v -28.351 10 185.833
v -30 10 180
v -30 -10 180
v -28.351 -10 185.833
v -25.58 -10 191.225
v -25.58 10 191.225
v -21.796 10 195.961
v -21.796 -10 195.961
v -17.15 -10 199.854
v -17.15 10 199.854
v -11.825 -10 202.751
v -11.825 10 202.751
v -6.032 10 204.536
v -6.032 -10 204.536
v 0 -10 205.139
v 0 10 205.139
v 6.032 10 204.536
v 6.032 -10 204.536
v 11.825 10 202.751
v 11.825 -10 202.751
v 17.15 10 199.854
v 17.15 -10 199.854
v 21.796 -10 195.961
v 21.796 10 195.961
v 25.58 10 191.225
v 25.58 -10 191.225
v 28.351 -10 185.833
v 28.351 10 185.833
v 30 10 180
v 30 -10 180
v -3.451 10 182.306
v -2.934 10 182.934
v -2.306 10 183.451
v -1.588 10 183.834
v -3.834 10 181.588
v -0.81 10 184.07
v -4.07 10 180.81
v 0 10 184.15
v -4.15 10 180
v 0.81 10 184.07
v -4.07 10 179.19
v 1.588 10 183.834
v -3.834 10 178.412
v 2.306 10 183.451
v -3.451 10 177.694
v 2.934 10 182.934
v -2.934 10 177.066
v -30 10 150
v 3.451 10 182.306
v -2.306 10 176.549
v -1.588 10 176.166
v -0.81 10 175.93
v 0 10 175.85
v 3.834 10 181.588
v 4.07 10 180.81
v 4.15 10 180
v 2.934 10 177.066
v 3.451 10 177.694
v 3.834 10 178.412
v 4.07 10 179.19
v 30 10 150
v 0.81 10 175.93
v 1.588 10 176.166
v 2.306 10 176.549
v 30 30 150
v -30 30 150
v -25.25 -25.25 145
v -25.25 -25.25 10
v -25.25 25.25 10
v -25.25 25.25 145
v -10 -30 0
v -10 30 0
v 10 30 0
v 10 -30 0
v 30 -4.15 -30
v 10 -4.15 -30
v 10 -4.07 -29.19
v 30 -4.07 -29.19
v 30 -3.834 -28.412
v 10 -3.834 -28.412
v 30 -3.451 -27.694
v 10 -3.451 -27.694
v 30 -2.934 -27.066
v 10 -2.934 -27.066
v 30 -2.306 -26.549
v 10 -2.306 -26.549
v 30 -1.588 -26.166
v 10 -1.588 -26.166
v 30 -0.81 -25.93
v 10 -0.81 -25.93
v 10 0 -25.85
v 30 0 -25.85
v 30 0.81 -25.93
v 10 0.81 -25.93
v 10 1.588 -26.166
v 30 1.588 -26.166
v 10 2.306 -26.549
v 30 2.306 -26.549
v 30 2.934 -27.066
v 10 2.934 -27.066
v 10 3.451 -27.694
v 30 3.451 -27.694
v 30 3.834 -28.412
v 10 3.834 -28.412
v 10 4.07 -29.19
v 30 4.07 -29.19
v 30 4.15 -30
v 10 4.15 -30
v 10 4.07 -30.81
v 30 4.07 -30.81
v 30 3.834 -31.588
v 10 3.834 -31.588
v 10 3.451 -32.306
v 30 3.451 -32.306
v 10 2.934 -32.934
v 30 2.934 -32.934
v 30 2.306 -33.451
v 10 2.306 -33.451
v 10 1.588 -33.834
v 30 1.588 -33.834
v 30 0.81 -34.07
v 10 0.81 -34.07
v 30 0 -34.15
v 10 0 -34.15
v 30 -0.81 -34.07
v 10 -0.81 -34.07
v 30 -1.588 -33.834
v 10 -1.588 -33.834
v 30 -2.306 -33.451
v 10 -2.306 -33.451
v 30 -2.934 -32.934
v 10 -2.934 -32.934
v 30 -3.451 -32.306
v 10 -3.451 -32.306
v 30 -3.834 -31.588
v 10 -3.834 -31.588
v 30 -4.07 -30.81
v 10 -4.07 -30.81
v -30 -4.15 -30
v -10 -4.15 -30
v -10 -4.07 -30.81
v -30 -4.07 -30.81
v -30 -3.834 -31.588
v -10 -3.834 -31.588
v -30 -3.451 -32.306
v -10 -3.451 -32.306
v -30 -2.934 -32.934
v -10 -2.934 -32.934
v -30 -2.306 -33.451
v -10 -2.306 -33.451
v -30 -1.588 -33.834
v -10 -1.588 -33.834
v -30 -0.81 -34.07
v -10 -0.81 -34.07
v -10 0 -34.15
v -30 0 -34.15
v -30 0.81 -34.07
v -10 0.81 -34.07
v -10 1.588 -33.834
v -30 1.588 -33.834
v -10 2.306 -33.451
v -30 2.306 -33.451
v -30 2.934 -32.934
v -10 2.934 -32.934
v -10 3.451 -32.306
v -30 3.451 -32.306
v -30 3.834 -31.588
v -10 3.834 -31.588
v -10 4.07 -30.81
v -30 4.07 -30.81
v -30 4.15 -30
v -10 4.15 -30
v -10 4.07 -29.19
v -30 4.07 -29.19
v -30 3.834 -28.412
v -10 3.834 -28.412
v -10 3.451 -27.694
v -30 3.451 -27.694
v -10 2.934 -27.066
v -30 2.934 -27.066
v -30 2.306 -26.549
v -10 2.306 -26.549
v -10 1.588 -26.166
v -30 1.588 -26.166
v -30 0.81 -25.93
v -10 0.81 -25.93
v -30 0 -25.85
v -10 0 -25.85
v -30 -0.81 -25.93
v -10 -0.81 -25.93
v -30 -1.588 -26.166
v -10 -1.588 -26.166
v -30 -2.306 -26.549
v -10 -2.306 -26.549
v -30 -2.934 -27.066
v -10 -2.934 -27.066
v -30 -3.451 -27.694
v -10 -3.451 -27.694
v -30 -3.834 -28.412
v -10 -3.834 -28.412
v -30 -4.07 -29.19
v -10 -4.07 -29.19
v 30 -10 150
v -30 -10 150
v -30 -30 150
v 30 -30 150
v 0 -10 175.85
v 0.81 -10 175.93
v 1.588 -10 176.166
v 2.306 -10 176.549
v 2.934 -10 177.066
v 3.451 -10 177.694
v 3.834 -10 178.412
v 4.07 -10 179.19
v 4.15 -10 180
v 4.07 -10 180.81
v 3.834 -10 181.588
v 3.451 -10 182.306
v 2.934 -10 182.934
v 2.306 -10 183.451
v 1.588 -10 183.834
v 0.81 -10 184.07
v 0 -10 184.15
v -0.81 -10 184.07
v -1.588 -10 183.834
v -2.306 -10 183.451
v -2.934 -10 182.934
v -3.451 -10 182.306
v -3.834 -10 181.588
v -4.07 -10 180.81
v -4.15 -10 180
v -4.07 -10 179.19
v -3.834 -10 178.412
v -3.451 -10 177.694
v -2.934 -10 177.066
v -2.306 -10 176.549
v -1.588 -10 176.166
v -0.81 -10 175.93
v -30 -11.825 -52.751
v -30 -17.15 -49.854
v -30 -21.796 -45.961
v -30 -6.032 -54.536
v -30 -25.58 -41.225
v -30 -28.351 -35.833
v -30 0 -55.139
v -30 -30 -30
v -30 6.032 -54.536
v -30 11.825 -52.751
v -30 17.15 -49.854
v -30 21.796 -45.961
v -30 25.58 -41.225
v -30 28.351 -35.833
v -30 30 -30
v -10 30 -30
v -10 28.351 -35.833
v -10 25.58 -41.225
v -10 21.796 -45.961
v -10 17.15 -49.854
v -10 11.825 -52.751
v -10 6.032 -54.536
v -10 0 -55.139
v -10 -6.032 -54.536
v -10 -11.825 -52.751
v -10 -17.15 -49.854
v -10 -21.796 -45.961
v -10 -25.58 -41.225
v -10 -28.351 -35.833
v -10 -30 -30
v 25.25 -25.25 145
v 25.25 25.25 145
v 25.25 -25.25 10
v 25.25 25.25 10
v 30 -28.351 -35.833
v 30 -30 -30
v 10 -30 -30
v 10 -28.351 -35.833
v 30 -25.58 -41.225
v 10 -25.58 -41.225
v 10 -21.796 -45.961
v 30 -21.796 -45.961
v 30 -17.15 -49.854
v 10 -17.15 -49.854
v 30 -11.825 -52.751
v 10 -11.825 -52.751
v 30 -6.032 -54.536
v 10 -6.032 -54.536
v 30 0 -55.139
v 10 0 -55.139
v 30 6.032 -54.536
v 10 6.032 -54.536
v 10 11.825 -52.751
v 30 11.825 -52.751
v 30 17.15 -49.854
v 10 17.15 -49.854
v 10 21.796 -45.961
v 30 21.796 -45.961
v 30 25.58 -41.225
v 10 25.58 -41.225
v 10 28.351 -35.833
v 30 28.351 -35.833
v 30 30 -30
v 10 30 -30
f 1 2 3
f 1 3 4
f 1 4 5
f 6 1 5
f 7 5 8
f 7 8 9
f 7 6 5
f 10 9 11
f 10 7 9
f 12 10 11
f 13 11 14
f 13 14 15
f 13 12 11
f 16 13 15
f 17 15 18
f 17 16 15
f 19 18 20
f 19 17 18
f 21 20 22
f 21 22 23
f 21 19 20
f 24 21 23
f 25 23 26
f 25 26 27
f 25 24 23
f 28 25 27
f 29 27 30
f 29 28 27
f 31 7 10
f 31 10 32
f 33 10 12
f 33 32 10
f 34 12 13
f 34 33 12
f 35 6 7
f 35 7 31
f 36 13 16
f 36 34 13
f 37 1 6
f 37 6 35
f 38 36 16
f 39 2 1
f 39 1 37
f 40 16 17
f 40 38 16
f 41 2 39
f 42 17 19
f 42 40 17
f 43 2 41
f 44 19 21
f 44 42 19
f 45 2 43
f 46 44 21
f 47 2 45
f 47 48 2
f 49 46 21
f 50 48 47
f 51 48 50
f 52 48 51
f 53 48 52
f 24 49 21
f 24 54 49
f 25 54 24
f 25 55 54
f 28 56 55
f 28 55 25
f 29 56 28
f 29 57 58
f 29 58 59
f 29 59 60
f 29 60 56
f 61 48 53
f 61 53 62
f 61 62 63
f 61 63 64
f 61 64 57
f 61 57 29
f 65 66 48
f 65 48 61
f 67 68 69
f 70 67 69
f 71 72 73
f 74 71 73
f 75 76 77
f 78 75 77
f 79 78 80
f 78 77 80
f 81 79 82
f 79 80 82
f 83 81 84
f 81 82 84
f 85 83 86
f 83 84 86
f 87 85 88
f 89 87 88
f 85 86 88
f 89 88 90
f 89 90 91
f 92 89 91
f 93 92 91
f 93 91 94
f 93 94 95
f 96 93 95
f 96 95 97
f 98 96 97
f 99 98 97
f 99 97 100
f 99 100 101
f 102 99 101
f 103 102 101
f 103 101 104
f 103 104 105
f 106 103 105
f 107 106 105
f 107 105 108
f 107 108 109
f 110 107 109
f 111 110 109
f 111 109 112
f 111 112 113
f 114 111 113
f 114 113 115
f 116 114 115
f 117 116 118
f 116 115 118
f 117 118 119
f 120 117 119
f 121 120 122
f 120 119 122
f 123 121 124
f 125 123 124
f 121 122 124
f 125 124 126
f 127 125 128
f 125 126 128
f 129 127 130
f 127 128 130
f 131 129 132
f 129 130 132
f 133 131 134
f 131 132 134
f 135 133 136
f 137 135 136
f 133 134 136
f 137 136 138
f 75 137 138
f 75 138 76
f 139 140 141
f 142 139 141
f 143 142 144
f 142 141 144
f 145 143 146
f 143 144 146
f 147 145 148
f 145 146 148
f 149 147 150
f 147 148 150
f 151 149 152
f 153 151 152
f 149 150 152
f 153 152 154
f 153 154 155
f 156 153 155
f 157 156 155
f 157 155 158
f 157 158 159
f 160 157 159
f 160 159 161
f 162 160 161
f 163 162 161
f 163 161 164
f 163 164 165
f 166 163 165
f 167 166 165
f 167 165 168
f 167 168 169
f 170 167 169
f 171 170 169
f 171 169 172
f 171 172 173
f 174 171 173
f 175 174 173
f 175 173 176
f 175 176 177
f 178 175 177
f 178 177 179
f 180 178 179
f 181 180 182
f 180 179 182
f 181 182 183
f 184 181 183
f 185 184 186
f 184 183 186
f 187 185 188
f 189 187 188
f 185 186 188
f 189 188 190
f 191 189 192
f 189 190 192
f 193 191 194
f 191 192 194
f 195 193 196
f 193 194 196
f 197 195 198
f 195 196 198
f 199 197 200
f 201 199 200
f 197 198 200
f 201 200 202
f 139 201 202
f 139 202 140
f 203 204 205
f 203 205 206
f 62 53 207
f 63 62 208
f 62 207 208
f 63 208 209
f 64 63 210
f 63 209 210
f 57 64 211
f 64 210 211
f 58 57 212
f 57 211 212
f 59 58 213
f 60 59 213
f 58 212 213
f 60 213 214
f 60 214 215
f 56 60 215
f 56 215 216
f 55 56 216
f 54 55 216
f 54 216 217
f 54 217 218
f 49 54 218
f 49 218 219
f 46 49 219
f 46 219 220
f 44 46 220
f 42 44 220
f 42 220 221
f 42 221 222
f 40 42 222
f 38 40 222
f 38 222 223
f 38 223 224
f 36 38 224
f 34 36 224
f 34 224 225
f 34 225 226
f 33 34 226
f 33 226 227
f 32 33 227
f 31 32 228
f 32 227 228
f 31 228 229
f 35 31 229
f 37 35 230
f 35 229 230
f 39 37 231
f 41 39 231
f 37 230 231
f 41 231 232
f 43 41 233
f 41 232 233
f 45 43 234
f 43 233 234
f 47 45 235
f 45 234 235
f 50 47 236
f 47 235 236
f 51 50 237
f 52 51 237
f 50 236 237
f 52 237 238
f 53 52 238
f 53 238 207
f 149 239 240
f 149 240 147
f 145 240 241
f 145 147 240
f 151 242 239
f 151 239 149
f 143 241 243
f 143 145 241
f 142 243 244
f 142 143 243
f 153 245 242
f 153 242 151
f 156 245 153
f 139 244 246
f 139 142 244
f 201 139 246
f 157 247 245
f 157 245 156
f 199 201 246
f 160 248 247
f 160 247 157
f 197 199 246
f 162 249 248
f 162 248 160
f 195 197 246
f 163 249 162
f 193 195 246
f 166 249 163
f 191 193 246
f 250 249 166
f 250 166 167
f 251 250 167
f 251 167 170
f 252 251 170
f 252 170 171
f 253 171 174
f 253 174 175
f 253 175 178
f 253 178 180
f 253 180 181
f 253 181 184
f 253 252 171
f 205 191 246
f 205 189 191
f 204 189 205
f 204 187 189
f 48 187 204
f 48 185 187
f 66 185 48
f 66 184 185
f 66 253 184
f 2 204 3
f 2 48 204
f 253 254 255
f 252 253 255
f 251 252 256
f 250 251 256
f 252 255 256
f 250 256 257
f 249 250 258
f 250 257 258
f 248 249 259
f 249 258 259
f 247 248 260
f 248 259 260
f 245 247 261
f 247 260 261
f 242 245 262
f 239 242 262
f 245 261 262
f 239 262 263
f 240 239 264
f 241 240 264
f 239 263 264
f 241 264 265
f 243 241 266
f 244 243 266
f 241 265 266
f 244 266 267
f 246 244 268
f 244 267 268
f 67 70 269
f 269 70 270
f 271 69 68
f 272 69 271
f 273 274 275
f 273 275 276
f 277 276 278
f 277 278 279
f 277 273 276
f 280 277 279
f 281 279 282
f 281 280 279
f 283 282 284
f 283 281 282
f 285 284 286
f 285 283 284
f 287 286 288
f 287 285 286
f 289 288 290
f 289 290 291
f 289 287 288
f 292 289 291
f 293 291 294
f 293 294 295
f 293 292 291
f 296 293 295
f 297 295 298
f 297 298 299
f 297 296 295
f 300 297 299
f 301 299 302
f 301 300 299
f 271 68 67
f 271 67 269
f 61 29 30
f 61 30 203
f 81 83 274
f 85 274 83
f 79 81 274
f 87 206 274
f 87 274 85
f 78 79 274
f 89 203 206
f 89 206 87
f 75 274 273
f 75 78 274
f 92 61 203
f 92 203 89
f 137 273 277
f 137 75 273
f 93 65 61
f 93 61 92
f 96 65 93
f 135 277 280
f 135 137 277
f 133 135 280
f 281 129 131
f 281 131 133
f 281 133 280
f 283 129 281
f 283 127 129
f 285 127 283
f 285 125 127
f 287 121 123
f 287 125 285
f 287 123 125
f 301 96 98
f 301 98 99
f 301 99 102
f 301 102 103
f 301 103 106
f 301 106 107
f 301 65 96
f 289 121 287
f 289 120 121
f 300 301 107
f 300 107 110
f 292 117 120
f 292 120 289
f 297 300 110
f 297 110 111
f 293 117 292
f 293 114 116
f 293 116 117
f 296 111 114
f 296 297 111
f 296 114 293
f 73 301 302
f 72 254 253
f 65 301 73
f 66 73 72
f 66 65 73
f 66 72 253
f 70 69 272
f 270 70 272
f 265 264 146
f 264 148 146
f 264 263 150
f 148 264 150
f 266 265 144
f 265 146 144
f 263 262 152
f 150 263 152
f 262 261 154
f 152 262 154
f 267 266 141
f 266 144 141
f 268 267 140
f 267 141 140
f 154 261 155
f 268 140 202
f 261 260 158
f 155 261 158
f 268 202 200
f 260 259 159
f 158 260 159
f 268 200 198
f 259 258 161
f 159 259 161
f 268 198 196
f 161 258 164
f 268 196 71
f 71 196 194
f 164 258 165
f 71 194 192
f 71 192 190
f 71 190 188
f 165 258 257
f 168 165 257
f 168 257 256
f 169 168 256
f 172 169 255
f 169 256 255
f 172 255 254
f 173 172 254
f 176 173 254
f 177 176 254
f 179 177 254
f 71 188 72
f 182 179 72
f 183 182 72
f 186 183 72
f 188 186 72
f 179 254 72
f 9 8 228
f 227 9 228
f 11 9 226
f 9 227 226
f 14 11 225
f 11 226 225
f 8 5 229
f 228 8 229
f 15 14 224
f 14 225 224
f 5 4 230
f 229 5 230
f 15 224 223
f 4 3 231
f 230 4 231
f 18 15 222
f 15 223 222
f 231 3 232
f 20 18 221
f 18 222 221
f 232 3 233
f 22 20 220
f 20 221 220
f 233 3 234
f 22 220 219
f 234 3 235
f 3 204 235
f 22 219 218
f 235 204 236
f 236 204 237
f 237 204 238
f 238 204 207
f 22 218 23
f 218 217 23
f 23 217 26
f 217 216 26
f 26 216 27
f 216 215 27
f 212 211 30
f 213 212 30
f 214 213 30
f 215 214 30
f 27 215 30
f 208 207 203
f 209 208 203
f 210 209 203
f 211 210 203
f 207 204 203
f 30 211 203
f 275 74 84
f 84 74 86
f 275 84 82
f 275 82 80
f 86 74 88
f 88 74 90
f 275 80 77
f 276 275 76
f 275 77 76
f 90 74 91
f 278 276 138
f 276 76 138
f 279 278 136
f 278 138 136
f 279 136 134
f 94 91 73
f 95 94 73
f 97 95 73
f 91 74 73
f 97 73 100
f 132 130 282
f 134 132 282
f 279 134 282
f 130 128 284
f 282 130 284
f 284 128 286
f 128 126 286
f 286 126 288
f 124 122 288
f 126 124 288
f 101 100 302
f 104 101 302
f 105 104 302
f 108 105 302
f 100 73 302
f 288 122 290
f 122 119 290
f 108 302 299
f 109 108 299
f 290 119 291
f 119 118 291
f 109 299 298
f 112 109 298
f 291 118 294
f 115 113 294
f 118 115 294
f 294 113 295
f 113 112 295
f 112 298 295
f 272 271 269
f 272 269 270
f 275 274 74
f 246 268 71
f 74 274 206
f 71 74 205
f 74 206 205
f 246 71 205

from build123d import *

# Parameters (mm, degrees)
SKETCH2_W               = 60
SKETCH2_H               = 60
BOSS_EXTRUDE1_DEPTH     = 150
SKETCH3_W               = 20
SKETCH3_H               = 60
BOSS_EXTRUDE2_DEPTH     = 30
BOSS_EXTRUDE3_DEPTH     = 20
BOSS_EXTRUDE4_START     = -20
BOSS_EXTRUDE4_DEPTH     = 20
SKETCH6_W               = 60
SKETCH6_H               = 20
BOSS_EXTRUDE5_DEPTH     = 30
BOSS_EXTRUDE6_DEPTH     = 20
CUT_EXTRUDE2_DEPTH      = 5
CUT_EXTRUDE2_DEPTH_BACK = 130
CUT_EXTRUDE2_START      = -10
SKETCH8_W               = 50.5
SKETCH8_H               = 50.5
SKETCH9_R               = 4.15
CUT_EXTRUDE3_DEPTH      = 130
SKETCH11_R              = 4.15
CUT_EXTRUDE4_DEPTH      = 212.144400343
SKETCH12_R              = 4.15
CUT_EXTRUDE5_DEPTH      = 212.144400343


with BuildPart() as part:
    # Sketch2 → Boss-Extrude1 (new body)
    with BuildSketch(Plane.XY):
        Rectangle(SKETCH2_W, SKETCH2_H)
    extrude(amount=BOSS_EXTRUDE1_DEPTH)

    # Sketch3 → Boss-Extrude2 (add)
    with BuildSketch(Plane(origin=(0, 0, 0), x_dir=(-1, 0, 0), z_dir=(0, 0, -1))):
        with Locations((20, 0)):
            Rectangle(SKETCH3_W, SKETCH3_H)
        with Locations((-20, 0)):
            Rectangle(SKETCH3_W, SKETCH3_H)
    extrude(amount=BOSS_EXTRUDE2_DEPTH)

    # Sketch4 → Boss-Extrude3 (add)
    with BuildSketch(Plane(origin=(30, 0, 0), x_dir=(0, 0, -1), z_dir=(1, 0, 0))):
        with BuildLine():
            Line((30, 30), (30, -30))
            ThreePointArc((30, -30), (55.138874415, 0), (30, 30))
        make_face()
    extrude(amount=-BOSS_EXTRUDE3_DEPTH)

    # Sketch5 → Boss-Extrude4 (add)
    with BuildSketch(Plane.ZY.offset(30).offset(BOSS_EXTRUDE4_START)):
        with BuildLine():
            Line((-30, -30), (-30, 30))
            ThreePointArc((-30, 30), (-55.138874415, 0), (-30, -30))
        make_face()
    extrude(amount=BOSS_EXTRUDE4_DEPTH)

    # Sketch6 → Boss-Extrude5 (add)
    with BuildSketch(Plane.XY.offset(150)):
        Rectangle(SKETCH6_W, SKETCH6_H)
    extrude(amount=BOSS_EXTRUDE5_DEPTH)

    # Sketch7 → Boss-Extrude6 (add)
    with BuildSketch(Plane(origin=(0, 10, 0), x_dir=(1, 0, 0), z_dir=(0, 1, 0))):
        with BuildLine():
            Line((30, -180), (-30, -180))
            ThreePointArc((-30, -180), (0, -205.138874415), (30, -180))
        make_face()
    extrude(amount=-BOSS_EXTRUDE6_DEPTH)

    # Sketch8 → Cut-Extrude2 (cut, two sides: drawn at the far end of the back side and taken through both)
    with BuildSketch(Plane.XY.offset(150).offset(CUT_EXTRUDE2_START - CUT_EXTRUDE2_DEPTH_BACK)):
        Rectangle(SKETCH8_W, SKETCH8_H)
    extrude(amount=CUT_EXTRUDE2_DEPTH + CUT_EXTRUDE2_DEPTH_BACK, mode=Mode.SUBTRACT)

    # Sketch9 → Cut-Extrude3 (cut)
    with BuildSketch(Plane(origin=(0, -10, 0), x_dir=(-1, 0, 0), z_dir=(0, -1, 0))):
        with Locations(Location((0, -180, 0), (0, 0, 90))):
            Circle(SKETCH9_R)
    extrude(amount=-CUT_EXTRUDE3_DEPTH, mode=Mode.SUBTRACT)

    # Sketch11 → Cut-Extrude4 (cut, through all)
    with BuildSketch(Plane.ZY.offset(-10)):
        with Locations(Location((-30, 0, 0), (0, 0, 270))):
            Circle(SKETCH11_R)
    extrude(amount=-CUT_EXTRUDE4_DEPTH, mode=Mode.SUBTRACT)

    # Sketch12 → Cut-Extrude5 (cut, through all)
    with BuildSketch(Plane(origin=(-10, 0, 0), x_dir=(0, 0, -1), z_dir=(1, 0, 0))):
        with Locations(Location((30, 0, 0), (0, 0, 270))):
            Circle(SKETCH12_R)
    extrude(amount=-CUT_EXTRUDE5_DEPTH, mode=Mode.SUBTRACT)


solid = part.part
